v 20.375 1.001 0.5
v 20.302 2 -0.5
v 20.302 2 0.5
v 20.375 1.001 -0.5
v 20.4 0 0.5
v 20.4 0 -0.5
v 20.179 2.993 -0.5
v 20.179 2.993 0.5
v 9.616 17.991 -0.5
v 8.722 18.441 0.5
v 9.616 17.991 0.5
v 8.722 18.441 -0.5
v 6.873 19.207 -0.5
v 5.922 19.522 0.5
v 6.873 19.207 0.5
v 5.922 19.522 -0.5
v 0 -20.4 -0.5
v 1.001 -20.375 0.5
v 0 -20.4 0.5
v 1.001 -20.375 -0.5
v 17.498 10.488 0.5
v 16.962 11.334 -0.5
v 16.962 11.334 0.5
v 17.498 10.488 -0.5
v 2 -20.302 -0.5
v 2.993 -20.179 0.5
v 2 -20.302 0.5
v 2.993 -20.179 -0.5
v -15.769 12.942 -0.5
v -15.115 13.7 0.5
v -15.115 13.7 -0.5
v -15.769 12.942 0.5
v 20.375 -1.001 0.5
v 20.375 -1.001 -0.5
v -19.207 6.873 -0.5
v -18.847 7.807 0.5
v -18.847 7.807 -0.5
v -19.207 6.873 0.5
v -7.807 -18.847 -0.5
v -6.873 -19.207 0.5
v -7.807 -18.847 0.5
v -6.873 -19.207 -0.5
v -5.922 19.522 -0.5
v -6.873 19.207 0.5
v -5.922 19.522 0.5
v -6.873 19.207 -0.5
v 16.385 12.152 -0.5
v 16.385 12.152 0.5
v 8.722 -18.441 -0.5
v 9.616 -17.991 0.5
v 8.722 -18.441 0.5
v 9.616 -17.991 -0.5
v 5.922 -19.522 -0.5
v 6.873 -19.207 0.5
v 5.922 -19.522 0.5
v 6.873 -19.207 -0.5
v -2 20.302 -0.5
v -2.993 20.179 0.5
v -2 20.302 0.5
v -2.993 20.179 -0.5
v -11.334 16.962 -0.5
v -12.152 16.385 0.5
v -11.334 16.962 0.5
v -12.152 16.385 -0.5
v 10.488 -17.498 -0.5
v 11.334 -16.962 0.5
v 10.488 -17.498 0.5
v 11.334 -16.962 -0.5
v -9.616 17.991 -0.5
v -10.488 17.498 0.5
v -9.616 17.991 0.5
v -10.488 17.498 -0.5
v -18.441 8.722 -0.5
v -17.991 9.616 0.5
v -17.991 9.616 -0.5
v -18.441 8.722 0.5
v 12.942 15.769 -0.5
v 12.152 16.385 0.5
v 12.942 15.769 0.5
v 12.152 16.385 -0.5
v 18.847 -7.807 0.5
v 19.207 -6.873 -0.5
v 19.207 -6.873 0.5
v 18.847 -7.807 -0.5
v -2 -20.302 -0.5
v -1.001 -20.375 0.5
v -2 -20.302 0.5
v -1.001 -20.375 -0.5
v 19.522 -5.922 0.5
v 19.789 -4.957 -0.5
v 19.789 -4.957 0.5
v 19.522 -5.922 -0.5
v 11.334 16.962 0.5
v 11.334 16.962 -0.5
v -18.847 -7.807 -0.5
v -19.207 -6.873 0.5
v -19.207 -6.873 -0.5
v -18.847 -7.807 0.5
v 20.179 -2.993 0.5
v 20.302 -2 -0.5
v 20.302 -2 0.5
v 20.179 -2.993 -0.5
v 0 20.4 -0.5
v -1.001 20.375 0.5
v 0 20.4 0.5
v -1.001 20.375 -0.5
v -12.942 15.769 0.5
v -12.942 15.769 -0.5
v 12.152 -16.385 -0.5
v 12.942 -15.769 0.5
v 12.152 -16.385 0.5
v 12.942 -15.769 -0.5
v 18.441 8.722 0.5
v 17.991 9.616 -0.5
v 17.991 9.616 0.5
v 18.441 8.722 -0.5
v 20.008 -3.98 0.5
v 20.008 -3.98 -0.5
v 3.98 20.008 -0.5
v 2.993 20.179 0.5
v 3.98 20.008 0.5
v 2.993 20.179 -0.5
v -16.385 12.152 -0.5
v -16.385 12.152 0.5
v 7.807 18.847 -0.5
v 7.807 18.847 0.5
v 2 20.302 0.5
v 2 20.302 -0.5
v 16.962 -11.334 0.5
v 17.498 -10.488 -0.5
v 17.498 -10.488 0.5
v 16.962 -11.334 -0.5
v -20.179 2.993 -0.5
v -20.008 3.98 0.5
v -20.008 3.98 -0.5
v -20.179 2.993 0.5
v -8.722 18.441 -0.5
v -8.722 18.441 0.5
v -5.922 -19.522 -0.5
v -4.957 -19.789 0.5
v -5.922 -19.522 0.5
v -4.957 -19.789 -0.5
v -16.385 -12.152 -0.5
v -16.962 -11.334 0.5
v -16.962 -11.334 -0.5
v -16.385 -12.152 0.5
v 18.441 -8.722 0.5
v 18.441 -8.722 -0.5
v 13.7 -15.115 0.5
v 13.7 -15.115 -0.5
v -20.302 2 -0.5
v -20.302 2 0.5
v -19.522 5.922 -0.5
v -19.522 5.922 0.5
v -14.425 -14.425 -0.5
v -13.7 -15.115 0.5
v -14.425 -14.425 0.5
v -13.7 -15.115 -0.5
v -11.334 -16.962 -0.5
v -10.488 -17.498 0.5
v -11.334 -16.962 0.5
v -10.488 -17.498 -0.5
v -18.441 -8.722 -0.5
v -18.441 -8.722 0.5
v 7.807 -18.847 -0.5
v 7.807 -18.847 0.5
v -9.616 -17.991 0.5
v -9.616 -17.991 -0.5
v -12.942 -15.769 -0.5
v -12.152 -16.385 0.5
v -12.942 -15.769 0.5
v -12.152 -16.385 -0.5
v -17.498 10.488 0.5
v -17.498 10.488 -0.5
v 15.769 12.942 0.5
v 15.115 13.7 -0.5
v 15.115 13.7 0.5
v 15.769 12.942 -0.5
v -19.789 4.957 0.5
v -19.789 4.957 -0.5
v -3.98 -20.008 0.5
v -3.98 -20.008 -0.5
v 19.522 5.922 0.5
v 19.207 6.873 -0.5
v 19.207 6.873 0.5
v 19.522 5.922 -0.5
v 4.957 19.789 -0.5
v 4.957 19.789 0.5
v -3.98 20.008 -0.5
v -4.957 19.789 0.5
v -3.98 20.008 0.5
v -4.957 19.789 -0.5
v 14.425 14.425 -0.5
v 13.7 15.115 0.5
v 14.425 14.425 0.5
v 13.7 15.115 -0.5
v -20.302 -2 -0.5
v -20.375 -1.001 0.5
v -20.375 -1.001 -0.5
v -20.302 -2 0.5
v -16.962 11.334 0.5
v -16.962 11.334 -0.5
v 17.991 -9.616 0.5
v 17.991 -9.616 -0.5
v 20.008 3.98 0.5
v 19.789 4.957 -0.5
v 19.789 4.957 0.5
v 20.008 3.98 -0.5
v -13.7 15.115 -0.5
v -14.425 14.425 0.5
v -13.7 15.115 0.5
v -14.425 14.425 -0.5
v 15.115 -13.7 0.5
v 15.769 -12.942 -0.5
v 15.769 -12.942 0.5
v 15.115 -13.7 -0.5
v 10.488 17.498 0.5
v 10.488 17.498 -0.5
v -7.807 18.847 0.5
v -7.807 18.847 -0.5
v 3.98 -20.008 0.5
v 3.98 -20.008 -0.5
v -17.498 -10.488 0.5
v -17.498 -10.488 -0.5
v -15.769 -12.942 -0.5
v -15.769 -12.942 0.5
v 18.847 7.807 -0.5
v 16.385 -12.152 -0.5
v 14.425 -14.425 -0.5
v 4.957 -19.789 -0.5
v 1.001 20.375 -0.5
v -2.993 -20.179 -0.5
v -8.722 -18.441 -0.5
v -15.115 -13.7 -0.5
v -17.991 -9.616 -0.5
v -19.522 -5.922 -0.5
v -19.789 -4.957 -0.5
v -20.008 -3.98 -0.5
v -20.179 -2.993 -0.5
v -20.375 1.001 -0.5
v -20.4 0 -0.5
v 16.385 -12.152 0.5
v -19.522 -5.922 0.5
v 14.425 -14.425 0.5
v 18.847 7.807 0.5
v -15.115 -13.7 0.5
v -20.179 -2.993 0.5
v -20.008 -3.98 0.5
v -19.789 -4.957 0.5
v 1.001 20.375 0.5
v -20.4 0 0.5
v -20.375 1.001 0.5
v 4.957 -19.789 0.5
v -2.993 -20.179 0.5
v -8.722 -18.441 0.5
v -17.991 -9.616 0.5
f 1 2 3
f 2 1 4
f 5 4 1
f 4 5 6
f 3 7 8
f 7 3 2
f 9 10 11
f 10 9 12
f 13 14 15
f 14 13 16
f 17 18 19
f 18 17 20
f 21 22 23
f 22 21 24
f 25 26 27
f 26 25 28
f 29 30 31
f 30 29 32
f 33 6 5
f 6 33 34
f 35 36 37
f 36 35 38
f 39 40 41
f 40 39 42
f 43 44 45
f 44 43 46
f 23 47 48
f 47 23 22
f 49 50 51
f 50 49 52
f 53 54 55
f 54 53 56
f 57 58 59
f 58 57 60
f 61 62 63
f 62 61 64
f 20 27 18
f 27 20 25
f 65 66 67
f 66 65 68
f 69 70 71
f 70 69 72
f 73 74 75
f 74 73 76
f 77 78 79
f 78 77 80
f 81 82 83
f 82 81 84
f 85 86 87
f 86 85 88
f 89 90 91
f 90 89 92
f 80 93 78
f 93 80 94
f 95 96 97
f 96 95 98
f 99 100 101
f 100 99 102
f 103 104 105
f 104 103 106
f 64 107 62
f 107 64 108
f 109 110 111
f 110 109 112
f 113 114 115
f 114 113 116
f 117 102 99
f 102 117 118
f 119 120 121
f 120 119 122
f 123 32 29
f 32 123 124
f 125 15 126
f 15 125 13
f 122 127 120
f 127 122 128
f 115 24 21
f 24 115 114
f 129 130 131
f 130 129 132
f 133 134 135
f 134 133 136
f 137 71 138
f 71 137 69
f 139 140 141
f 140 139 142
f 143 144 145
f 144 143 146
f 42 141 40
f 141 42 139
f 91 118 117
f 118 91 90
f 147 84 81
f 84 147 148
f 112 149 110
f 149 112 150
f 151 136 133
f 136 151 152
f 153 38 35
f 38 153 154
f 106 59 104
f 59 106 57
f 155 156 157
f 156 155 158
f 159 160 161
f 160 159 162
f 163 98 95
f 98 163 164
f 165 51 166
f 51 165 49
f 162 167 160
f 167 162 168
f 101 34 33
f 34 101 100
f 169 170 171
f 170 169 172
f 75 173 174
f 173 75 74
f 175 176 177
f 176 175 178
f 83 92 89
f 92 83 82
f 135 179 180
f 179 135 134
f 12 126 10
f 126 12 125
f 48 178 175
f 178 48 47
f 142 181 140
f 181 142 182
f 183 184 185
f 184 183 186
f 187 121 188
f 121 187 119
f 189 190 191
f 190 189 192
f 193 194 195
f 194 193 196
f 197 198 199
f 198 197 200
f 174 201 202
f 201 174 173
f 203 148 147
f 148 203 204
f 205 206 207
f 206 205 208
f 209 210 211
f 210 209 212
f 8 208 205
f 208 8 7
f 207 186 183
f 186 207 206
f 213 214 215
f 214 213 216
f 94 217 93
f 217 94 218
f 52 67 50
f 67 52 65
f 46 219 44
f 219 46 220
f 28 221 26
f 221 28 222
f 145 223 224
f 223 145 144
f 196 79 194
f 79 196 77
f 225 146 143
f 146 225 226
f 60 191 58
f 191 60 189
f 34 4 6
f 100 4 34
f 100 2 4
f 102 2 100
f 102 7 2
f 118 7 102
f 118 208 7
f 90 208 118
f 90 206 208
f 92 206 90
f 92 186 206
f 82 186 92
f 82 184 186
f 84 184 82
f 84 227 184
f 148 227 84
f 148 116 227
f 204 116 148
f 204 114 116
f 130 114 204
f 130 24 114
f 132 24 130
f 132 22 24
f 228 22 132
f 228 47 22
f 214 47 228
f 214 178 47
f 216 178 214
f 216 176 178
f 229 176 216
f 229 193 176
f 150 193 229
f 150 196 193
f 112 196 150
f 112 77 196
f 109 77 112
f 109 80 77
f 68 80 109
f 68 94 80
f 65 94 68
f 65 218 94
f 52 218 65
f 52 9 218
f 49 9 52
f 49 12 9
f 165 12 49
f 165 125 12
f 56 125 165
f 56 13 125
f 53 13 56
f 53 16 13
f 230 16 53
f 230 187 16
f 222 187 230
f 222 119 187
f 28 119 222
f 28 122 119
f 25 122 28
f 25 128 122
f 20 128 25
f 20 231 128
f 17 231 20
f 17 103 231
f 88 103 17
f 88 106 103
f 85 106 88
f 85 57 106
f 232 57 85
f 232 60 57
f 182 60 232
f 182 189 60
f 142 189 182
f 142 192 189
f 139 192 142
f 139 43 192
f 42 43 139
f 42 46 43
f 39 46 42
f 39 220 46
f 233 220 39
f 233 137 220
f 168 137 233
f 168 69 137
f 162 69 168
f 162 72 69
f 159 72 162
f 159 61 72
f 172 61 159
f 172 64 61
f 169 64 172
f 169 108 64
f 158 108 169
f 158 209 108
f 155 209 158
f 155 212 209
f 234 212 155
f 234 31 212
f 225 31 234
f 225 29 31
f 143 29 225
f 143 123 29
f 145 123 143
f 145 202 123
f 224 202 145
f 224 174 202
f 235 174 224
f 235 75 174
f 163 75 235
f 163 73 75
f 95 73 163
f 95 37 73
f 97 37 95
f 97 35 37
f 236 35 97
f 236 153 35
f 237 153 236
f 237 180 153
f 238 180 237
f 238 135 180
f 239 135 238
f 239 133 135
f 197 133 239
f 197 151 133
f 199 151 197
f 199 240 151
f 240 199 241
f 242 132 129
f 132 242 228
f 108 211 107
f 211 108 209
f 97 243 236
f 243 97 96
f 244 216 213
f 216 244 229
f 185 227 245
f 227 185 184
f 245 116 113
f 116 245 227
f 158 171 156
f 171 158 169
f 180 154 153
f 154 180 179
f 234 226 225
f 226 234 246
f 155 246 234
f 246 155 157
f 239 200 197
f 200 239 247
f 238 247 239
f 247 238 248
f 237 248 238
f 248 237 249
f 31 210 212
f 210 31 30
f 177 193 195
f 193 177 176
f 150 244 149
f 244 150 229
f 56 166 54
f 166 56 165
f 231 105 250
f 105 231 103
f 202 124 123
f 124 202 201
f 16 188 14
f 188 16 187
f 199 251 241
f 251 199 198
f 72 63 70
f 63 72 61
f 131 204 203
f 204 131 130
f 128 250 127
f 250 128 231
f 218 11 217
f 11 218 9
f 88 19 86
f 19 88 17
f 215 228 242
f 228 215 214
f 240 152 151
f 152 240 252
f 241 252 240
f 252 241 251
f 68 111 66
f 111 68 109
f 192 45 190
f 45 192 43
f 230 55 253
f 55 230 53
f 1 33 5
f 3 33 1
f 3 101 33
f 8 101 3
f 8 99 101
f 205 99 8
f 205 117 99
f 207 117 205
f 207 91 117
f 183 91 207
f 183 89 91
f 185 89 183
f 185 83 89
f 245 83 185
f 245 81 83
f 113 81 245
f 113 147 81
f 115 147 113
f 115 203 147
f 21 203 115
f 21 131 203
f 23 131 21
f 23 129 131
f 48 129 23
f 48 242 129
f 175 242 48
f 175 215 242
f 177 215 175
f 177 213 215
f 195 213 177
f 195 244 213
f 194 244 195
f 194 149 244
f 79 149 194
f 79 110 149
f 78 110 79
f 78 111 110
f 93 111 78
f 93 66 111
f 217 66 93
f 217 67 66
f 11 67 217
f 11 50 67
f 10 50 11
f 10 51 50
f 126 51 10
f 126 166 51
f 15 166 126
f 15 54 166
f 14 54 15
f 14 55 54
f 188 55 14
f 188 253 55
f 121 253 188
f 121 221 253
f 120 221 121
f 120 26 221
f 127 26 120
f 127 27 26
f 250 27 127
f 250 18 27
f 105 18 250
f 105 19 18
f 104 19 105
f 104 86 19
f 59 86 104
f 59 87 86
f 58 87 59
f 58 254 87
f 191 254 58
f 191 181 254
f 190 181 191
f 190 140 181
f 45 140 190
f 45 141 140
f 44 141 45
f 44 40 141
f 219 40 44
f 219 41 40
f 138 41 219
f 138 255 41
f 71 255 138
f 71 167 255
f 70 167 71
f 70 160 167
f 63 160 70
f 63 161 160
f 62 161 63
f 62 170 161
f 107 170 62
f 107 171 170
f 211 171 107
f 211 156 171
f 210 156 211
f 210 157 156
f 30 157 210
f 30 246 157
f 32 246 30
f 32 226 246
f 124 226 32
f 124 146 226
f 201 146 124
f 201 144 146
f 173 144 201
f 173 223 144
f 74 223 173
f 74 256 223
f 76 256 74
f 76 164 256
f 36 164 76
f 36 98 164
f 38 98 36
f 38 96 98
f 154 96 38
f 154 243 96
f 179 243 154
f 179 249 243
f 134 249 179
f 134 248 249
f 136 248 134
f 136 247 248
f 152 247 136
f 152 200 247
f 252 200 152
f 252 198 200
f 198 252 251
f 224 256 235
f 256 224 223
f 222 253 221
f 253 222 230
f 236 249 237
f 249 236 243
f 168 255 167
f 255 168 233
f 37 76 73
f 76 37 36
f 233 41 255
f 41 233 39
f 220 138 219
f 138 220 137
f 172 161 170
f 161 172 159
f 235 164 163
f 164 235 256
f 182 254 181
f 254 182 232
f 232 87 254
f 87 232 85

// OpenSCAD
$fn=128;

radii = [20.4, 10.8, 5.3, 1];

module radial_stack(rs, h=1) {
    union() {
        for (i = [0:len(rs)-1]) {
            cylinder(h=h, r=rs[i], center=true);
        }
    }
}

radial_stack(radii, h=1);
